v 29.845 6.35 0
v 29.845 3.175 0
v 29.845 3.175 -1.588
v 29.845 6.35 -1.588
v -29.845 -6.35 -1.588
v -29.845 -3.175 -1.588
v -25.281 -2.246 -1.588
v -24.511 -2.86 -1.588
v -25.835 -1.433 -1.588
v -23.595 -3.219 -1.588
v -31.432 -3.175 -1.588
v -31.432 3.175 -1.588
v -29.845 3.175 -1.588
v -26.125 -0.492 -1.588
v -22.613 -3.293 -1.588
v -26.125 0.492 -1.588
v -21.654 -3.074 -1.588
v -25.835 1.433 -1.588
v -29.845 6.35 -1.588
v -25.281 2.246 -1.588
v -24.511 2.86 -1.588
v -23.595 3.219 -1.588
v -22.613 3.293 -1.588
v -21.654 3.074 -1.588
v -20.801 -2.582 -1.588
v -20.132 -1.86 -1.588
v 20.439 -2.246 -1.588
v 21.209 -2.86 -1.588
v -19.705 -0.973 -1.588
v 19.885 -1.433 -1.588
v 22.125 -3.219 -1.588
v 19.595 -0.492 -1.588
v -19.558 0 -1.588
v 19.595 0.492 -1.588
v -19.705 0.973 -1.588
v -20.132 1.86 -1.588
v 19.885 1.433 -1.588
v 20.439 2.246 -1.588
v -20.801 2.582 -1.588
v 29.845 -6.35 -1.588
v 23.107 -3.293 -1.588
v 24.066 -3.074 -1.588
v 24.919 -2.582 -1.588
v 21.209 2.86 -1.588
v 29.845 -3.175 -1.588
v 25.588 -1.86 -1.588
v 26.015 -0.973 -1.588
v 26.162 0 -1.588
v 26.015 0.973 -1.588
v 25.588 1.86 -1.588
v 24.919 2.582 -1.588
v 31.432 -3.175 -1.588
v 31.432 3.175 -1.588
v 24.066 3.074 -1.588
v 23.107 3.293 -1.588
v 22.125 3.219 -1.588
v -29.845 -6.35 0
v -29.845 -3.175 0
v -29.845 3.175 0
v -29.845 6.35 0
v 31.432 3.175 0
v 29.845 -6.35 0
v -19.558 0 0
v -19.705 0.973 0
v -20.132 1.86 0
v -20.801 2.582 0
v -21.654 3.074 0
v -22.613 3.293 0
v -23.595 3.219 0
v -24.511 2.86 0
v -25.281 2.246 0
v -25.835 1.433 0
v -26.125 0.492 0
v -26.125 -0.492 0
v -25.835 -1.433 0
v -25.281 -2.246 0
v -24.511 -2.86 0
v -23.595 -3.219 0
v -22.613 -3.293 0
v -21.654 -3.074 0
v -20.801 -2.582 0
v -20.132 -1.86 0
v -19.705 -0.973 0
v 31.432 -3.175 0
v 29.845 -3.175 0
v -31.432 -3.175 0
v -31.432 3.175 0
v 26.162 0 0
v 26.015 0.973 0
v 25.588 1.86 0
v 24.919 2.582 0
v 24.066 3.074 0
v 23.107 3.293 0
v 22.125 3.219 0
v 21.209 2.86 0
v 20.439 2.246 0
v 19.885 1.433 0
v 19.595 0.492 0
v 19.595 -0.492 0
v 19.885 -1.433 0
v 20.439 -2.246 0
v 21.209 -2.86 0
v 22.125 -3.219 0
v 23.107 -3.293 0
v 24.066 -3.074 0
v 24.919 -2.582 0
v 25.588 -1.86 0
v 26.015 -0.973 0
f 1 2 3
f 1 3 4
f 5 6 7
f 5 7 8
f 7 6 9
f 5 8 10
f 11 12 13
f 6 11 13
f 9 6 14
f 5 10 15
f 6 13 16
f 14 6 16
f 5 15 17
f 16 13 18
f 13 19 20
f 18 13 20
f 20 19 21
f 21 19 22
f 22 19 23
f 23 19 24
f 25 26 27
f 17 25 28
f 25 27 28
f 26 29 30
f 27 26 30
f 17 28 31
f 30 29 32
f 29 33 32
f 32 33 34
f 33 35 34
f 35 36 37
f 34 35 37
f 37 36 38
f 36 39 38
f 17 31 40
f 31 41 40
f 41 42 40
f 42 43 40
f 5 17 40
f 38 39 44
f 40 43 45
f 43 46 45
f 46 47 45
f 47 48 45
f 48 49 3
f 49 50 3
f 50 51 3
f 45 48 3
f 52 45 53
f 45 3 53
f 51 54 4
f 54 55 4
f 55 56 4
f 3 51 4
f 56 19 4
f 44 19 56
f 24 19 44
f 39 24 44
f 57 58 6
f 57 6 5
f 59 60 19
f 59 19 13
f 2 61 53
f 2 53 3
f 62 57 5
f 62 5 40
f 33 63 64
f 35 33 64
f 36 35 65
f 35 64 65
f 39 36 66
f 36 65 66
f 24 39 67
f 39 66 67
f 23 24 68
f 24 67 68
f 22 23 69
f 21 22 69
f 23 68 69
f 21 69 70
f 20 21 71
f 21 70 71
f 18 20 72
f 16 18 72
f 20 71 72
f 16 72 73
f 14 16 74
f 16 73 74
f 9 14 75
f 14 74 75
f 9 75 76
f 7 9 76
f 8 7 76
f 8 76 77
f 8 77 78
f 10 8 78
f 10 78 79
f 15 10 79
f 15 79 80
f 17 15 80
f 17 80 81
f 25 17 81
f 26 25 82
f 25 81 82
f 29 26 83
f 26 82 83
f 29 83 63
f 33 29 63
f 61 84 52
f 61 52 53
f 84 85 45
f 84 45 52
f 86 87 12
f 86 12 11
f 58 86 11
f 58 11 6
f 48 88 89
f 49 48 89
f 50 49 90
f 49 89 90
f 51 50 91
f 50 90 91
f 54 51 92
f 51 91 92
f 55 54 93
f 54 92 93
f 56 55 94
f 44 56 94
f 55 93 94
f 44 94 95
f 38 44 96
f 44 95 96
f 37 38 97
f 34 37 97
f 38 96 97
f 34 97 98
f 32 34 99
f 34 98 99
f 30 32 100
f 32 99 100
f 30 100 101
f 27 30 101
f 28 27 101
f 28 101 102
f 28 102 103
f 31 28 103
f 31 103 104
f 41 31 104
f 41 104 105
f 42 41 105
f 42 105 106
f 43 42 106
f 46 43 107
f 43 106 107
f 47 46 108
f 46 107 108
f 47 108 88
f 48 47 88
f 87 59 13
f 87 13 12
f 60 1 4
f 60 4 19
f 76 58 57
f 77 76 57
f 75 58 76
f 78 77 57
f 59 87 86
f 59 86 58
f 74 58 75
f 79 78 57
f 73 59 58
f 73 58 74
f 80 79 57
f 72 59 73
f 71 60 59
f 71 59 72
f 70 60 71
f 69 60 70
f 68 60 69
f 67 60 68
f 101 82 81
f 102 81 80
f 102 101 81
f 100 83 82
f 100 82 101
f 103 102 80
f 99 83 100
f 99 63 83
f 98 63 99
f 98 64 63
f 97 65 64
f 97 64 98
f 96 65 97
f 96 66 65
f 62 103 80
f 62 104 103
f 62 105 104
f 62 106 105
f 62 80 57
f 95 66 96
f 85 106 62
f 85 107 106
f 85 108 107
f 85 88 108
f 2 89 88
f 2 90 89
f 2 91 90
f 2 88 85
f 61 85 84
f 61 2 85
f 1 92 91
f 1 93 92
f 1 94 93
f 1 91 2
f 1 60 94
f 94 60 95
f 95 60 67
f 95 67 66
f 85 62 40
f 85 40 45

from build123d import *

# Parameters (mm, degrees)
SKETCH1_R           = 3.302
BOSS_EXTRUDE1_DEPTH = 1.5875


with BuildPart() as part:
    # Sketch1 → Boss-Extrude1 (new body)
    with BuildSketch(Plane.XY):
        Polygon((29.845, -3.175), (31.4325, -3.175), (31.4325, 3.175), (29.845, 3.175), (29.845, 6.35), (-29.845, 6.35), (-29.845, 3.175), (-31.4325, 3.175), (-31.4325, -3.175), (-29.845, -3.175), (-29.845, -6.35), (29.845, -6.35), align=None)
        with Locations((-22.86, 0)):
            Circle(SKETCH1_R, mode=Mode.SUBTRACT)
        with Locations((22.86, 0)):
            Circle(SKETCH1_R, mode=Mode.SUBTRACT)
    extrude(amount=-BOSS_EXTRUDE1_DEPTH)


solid = part.part
